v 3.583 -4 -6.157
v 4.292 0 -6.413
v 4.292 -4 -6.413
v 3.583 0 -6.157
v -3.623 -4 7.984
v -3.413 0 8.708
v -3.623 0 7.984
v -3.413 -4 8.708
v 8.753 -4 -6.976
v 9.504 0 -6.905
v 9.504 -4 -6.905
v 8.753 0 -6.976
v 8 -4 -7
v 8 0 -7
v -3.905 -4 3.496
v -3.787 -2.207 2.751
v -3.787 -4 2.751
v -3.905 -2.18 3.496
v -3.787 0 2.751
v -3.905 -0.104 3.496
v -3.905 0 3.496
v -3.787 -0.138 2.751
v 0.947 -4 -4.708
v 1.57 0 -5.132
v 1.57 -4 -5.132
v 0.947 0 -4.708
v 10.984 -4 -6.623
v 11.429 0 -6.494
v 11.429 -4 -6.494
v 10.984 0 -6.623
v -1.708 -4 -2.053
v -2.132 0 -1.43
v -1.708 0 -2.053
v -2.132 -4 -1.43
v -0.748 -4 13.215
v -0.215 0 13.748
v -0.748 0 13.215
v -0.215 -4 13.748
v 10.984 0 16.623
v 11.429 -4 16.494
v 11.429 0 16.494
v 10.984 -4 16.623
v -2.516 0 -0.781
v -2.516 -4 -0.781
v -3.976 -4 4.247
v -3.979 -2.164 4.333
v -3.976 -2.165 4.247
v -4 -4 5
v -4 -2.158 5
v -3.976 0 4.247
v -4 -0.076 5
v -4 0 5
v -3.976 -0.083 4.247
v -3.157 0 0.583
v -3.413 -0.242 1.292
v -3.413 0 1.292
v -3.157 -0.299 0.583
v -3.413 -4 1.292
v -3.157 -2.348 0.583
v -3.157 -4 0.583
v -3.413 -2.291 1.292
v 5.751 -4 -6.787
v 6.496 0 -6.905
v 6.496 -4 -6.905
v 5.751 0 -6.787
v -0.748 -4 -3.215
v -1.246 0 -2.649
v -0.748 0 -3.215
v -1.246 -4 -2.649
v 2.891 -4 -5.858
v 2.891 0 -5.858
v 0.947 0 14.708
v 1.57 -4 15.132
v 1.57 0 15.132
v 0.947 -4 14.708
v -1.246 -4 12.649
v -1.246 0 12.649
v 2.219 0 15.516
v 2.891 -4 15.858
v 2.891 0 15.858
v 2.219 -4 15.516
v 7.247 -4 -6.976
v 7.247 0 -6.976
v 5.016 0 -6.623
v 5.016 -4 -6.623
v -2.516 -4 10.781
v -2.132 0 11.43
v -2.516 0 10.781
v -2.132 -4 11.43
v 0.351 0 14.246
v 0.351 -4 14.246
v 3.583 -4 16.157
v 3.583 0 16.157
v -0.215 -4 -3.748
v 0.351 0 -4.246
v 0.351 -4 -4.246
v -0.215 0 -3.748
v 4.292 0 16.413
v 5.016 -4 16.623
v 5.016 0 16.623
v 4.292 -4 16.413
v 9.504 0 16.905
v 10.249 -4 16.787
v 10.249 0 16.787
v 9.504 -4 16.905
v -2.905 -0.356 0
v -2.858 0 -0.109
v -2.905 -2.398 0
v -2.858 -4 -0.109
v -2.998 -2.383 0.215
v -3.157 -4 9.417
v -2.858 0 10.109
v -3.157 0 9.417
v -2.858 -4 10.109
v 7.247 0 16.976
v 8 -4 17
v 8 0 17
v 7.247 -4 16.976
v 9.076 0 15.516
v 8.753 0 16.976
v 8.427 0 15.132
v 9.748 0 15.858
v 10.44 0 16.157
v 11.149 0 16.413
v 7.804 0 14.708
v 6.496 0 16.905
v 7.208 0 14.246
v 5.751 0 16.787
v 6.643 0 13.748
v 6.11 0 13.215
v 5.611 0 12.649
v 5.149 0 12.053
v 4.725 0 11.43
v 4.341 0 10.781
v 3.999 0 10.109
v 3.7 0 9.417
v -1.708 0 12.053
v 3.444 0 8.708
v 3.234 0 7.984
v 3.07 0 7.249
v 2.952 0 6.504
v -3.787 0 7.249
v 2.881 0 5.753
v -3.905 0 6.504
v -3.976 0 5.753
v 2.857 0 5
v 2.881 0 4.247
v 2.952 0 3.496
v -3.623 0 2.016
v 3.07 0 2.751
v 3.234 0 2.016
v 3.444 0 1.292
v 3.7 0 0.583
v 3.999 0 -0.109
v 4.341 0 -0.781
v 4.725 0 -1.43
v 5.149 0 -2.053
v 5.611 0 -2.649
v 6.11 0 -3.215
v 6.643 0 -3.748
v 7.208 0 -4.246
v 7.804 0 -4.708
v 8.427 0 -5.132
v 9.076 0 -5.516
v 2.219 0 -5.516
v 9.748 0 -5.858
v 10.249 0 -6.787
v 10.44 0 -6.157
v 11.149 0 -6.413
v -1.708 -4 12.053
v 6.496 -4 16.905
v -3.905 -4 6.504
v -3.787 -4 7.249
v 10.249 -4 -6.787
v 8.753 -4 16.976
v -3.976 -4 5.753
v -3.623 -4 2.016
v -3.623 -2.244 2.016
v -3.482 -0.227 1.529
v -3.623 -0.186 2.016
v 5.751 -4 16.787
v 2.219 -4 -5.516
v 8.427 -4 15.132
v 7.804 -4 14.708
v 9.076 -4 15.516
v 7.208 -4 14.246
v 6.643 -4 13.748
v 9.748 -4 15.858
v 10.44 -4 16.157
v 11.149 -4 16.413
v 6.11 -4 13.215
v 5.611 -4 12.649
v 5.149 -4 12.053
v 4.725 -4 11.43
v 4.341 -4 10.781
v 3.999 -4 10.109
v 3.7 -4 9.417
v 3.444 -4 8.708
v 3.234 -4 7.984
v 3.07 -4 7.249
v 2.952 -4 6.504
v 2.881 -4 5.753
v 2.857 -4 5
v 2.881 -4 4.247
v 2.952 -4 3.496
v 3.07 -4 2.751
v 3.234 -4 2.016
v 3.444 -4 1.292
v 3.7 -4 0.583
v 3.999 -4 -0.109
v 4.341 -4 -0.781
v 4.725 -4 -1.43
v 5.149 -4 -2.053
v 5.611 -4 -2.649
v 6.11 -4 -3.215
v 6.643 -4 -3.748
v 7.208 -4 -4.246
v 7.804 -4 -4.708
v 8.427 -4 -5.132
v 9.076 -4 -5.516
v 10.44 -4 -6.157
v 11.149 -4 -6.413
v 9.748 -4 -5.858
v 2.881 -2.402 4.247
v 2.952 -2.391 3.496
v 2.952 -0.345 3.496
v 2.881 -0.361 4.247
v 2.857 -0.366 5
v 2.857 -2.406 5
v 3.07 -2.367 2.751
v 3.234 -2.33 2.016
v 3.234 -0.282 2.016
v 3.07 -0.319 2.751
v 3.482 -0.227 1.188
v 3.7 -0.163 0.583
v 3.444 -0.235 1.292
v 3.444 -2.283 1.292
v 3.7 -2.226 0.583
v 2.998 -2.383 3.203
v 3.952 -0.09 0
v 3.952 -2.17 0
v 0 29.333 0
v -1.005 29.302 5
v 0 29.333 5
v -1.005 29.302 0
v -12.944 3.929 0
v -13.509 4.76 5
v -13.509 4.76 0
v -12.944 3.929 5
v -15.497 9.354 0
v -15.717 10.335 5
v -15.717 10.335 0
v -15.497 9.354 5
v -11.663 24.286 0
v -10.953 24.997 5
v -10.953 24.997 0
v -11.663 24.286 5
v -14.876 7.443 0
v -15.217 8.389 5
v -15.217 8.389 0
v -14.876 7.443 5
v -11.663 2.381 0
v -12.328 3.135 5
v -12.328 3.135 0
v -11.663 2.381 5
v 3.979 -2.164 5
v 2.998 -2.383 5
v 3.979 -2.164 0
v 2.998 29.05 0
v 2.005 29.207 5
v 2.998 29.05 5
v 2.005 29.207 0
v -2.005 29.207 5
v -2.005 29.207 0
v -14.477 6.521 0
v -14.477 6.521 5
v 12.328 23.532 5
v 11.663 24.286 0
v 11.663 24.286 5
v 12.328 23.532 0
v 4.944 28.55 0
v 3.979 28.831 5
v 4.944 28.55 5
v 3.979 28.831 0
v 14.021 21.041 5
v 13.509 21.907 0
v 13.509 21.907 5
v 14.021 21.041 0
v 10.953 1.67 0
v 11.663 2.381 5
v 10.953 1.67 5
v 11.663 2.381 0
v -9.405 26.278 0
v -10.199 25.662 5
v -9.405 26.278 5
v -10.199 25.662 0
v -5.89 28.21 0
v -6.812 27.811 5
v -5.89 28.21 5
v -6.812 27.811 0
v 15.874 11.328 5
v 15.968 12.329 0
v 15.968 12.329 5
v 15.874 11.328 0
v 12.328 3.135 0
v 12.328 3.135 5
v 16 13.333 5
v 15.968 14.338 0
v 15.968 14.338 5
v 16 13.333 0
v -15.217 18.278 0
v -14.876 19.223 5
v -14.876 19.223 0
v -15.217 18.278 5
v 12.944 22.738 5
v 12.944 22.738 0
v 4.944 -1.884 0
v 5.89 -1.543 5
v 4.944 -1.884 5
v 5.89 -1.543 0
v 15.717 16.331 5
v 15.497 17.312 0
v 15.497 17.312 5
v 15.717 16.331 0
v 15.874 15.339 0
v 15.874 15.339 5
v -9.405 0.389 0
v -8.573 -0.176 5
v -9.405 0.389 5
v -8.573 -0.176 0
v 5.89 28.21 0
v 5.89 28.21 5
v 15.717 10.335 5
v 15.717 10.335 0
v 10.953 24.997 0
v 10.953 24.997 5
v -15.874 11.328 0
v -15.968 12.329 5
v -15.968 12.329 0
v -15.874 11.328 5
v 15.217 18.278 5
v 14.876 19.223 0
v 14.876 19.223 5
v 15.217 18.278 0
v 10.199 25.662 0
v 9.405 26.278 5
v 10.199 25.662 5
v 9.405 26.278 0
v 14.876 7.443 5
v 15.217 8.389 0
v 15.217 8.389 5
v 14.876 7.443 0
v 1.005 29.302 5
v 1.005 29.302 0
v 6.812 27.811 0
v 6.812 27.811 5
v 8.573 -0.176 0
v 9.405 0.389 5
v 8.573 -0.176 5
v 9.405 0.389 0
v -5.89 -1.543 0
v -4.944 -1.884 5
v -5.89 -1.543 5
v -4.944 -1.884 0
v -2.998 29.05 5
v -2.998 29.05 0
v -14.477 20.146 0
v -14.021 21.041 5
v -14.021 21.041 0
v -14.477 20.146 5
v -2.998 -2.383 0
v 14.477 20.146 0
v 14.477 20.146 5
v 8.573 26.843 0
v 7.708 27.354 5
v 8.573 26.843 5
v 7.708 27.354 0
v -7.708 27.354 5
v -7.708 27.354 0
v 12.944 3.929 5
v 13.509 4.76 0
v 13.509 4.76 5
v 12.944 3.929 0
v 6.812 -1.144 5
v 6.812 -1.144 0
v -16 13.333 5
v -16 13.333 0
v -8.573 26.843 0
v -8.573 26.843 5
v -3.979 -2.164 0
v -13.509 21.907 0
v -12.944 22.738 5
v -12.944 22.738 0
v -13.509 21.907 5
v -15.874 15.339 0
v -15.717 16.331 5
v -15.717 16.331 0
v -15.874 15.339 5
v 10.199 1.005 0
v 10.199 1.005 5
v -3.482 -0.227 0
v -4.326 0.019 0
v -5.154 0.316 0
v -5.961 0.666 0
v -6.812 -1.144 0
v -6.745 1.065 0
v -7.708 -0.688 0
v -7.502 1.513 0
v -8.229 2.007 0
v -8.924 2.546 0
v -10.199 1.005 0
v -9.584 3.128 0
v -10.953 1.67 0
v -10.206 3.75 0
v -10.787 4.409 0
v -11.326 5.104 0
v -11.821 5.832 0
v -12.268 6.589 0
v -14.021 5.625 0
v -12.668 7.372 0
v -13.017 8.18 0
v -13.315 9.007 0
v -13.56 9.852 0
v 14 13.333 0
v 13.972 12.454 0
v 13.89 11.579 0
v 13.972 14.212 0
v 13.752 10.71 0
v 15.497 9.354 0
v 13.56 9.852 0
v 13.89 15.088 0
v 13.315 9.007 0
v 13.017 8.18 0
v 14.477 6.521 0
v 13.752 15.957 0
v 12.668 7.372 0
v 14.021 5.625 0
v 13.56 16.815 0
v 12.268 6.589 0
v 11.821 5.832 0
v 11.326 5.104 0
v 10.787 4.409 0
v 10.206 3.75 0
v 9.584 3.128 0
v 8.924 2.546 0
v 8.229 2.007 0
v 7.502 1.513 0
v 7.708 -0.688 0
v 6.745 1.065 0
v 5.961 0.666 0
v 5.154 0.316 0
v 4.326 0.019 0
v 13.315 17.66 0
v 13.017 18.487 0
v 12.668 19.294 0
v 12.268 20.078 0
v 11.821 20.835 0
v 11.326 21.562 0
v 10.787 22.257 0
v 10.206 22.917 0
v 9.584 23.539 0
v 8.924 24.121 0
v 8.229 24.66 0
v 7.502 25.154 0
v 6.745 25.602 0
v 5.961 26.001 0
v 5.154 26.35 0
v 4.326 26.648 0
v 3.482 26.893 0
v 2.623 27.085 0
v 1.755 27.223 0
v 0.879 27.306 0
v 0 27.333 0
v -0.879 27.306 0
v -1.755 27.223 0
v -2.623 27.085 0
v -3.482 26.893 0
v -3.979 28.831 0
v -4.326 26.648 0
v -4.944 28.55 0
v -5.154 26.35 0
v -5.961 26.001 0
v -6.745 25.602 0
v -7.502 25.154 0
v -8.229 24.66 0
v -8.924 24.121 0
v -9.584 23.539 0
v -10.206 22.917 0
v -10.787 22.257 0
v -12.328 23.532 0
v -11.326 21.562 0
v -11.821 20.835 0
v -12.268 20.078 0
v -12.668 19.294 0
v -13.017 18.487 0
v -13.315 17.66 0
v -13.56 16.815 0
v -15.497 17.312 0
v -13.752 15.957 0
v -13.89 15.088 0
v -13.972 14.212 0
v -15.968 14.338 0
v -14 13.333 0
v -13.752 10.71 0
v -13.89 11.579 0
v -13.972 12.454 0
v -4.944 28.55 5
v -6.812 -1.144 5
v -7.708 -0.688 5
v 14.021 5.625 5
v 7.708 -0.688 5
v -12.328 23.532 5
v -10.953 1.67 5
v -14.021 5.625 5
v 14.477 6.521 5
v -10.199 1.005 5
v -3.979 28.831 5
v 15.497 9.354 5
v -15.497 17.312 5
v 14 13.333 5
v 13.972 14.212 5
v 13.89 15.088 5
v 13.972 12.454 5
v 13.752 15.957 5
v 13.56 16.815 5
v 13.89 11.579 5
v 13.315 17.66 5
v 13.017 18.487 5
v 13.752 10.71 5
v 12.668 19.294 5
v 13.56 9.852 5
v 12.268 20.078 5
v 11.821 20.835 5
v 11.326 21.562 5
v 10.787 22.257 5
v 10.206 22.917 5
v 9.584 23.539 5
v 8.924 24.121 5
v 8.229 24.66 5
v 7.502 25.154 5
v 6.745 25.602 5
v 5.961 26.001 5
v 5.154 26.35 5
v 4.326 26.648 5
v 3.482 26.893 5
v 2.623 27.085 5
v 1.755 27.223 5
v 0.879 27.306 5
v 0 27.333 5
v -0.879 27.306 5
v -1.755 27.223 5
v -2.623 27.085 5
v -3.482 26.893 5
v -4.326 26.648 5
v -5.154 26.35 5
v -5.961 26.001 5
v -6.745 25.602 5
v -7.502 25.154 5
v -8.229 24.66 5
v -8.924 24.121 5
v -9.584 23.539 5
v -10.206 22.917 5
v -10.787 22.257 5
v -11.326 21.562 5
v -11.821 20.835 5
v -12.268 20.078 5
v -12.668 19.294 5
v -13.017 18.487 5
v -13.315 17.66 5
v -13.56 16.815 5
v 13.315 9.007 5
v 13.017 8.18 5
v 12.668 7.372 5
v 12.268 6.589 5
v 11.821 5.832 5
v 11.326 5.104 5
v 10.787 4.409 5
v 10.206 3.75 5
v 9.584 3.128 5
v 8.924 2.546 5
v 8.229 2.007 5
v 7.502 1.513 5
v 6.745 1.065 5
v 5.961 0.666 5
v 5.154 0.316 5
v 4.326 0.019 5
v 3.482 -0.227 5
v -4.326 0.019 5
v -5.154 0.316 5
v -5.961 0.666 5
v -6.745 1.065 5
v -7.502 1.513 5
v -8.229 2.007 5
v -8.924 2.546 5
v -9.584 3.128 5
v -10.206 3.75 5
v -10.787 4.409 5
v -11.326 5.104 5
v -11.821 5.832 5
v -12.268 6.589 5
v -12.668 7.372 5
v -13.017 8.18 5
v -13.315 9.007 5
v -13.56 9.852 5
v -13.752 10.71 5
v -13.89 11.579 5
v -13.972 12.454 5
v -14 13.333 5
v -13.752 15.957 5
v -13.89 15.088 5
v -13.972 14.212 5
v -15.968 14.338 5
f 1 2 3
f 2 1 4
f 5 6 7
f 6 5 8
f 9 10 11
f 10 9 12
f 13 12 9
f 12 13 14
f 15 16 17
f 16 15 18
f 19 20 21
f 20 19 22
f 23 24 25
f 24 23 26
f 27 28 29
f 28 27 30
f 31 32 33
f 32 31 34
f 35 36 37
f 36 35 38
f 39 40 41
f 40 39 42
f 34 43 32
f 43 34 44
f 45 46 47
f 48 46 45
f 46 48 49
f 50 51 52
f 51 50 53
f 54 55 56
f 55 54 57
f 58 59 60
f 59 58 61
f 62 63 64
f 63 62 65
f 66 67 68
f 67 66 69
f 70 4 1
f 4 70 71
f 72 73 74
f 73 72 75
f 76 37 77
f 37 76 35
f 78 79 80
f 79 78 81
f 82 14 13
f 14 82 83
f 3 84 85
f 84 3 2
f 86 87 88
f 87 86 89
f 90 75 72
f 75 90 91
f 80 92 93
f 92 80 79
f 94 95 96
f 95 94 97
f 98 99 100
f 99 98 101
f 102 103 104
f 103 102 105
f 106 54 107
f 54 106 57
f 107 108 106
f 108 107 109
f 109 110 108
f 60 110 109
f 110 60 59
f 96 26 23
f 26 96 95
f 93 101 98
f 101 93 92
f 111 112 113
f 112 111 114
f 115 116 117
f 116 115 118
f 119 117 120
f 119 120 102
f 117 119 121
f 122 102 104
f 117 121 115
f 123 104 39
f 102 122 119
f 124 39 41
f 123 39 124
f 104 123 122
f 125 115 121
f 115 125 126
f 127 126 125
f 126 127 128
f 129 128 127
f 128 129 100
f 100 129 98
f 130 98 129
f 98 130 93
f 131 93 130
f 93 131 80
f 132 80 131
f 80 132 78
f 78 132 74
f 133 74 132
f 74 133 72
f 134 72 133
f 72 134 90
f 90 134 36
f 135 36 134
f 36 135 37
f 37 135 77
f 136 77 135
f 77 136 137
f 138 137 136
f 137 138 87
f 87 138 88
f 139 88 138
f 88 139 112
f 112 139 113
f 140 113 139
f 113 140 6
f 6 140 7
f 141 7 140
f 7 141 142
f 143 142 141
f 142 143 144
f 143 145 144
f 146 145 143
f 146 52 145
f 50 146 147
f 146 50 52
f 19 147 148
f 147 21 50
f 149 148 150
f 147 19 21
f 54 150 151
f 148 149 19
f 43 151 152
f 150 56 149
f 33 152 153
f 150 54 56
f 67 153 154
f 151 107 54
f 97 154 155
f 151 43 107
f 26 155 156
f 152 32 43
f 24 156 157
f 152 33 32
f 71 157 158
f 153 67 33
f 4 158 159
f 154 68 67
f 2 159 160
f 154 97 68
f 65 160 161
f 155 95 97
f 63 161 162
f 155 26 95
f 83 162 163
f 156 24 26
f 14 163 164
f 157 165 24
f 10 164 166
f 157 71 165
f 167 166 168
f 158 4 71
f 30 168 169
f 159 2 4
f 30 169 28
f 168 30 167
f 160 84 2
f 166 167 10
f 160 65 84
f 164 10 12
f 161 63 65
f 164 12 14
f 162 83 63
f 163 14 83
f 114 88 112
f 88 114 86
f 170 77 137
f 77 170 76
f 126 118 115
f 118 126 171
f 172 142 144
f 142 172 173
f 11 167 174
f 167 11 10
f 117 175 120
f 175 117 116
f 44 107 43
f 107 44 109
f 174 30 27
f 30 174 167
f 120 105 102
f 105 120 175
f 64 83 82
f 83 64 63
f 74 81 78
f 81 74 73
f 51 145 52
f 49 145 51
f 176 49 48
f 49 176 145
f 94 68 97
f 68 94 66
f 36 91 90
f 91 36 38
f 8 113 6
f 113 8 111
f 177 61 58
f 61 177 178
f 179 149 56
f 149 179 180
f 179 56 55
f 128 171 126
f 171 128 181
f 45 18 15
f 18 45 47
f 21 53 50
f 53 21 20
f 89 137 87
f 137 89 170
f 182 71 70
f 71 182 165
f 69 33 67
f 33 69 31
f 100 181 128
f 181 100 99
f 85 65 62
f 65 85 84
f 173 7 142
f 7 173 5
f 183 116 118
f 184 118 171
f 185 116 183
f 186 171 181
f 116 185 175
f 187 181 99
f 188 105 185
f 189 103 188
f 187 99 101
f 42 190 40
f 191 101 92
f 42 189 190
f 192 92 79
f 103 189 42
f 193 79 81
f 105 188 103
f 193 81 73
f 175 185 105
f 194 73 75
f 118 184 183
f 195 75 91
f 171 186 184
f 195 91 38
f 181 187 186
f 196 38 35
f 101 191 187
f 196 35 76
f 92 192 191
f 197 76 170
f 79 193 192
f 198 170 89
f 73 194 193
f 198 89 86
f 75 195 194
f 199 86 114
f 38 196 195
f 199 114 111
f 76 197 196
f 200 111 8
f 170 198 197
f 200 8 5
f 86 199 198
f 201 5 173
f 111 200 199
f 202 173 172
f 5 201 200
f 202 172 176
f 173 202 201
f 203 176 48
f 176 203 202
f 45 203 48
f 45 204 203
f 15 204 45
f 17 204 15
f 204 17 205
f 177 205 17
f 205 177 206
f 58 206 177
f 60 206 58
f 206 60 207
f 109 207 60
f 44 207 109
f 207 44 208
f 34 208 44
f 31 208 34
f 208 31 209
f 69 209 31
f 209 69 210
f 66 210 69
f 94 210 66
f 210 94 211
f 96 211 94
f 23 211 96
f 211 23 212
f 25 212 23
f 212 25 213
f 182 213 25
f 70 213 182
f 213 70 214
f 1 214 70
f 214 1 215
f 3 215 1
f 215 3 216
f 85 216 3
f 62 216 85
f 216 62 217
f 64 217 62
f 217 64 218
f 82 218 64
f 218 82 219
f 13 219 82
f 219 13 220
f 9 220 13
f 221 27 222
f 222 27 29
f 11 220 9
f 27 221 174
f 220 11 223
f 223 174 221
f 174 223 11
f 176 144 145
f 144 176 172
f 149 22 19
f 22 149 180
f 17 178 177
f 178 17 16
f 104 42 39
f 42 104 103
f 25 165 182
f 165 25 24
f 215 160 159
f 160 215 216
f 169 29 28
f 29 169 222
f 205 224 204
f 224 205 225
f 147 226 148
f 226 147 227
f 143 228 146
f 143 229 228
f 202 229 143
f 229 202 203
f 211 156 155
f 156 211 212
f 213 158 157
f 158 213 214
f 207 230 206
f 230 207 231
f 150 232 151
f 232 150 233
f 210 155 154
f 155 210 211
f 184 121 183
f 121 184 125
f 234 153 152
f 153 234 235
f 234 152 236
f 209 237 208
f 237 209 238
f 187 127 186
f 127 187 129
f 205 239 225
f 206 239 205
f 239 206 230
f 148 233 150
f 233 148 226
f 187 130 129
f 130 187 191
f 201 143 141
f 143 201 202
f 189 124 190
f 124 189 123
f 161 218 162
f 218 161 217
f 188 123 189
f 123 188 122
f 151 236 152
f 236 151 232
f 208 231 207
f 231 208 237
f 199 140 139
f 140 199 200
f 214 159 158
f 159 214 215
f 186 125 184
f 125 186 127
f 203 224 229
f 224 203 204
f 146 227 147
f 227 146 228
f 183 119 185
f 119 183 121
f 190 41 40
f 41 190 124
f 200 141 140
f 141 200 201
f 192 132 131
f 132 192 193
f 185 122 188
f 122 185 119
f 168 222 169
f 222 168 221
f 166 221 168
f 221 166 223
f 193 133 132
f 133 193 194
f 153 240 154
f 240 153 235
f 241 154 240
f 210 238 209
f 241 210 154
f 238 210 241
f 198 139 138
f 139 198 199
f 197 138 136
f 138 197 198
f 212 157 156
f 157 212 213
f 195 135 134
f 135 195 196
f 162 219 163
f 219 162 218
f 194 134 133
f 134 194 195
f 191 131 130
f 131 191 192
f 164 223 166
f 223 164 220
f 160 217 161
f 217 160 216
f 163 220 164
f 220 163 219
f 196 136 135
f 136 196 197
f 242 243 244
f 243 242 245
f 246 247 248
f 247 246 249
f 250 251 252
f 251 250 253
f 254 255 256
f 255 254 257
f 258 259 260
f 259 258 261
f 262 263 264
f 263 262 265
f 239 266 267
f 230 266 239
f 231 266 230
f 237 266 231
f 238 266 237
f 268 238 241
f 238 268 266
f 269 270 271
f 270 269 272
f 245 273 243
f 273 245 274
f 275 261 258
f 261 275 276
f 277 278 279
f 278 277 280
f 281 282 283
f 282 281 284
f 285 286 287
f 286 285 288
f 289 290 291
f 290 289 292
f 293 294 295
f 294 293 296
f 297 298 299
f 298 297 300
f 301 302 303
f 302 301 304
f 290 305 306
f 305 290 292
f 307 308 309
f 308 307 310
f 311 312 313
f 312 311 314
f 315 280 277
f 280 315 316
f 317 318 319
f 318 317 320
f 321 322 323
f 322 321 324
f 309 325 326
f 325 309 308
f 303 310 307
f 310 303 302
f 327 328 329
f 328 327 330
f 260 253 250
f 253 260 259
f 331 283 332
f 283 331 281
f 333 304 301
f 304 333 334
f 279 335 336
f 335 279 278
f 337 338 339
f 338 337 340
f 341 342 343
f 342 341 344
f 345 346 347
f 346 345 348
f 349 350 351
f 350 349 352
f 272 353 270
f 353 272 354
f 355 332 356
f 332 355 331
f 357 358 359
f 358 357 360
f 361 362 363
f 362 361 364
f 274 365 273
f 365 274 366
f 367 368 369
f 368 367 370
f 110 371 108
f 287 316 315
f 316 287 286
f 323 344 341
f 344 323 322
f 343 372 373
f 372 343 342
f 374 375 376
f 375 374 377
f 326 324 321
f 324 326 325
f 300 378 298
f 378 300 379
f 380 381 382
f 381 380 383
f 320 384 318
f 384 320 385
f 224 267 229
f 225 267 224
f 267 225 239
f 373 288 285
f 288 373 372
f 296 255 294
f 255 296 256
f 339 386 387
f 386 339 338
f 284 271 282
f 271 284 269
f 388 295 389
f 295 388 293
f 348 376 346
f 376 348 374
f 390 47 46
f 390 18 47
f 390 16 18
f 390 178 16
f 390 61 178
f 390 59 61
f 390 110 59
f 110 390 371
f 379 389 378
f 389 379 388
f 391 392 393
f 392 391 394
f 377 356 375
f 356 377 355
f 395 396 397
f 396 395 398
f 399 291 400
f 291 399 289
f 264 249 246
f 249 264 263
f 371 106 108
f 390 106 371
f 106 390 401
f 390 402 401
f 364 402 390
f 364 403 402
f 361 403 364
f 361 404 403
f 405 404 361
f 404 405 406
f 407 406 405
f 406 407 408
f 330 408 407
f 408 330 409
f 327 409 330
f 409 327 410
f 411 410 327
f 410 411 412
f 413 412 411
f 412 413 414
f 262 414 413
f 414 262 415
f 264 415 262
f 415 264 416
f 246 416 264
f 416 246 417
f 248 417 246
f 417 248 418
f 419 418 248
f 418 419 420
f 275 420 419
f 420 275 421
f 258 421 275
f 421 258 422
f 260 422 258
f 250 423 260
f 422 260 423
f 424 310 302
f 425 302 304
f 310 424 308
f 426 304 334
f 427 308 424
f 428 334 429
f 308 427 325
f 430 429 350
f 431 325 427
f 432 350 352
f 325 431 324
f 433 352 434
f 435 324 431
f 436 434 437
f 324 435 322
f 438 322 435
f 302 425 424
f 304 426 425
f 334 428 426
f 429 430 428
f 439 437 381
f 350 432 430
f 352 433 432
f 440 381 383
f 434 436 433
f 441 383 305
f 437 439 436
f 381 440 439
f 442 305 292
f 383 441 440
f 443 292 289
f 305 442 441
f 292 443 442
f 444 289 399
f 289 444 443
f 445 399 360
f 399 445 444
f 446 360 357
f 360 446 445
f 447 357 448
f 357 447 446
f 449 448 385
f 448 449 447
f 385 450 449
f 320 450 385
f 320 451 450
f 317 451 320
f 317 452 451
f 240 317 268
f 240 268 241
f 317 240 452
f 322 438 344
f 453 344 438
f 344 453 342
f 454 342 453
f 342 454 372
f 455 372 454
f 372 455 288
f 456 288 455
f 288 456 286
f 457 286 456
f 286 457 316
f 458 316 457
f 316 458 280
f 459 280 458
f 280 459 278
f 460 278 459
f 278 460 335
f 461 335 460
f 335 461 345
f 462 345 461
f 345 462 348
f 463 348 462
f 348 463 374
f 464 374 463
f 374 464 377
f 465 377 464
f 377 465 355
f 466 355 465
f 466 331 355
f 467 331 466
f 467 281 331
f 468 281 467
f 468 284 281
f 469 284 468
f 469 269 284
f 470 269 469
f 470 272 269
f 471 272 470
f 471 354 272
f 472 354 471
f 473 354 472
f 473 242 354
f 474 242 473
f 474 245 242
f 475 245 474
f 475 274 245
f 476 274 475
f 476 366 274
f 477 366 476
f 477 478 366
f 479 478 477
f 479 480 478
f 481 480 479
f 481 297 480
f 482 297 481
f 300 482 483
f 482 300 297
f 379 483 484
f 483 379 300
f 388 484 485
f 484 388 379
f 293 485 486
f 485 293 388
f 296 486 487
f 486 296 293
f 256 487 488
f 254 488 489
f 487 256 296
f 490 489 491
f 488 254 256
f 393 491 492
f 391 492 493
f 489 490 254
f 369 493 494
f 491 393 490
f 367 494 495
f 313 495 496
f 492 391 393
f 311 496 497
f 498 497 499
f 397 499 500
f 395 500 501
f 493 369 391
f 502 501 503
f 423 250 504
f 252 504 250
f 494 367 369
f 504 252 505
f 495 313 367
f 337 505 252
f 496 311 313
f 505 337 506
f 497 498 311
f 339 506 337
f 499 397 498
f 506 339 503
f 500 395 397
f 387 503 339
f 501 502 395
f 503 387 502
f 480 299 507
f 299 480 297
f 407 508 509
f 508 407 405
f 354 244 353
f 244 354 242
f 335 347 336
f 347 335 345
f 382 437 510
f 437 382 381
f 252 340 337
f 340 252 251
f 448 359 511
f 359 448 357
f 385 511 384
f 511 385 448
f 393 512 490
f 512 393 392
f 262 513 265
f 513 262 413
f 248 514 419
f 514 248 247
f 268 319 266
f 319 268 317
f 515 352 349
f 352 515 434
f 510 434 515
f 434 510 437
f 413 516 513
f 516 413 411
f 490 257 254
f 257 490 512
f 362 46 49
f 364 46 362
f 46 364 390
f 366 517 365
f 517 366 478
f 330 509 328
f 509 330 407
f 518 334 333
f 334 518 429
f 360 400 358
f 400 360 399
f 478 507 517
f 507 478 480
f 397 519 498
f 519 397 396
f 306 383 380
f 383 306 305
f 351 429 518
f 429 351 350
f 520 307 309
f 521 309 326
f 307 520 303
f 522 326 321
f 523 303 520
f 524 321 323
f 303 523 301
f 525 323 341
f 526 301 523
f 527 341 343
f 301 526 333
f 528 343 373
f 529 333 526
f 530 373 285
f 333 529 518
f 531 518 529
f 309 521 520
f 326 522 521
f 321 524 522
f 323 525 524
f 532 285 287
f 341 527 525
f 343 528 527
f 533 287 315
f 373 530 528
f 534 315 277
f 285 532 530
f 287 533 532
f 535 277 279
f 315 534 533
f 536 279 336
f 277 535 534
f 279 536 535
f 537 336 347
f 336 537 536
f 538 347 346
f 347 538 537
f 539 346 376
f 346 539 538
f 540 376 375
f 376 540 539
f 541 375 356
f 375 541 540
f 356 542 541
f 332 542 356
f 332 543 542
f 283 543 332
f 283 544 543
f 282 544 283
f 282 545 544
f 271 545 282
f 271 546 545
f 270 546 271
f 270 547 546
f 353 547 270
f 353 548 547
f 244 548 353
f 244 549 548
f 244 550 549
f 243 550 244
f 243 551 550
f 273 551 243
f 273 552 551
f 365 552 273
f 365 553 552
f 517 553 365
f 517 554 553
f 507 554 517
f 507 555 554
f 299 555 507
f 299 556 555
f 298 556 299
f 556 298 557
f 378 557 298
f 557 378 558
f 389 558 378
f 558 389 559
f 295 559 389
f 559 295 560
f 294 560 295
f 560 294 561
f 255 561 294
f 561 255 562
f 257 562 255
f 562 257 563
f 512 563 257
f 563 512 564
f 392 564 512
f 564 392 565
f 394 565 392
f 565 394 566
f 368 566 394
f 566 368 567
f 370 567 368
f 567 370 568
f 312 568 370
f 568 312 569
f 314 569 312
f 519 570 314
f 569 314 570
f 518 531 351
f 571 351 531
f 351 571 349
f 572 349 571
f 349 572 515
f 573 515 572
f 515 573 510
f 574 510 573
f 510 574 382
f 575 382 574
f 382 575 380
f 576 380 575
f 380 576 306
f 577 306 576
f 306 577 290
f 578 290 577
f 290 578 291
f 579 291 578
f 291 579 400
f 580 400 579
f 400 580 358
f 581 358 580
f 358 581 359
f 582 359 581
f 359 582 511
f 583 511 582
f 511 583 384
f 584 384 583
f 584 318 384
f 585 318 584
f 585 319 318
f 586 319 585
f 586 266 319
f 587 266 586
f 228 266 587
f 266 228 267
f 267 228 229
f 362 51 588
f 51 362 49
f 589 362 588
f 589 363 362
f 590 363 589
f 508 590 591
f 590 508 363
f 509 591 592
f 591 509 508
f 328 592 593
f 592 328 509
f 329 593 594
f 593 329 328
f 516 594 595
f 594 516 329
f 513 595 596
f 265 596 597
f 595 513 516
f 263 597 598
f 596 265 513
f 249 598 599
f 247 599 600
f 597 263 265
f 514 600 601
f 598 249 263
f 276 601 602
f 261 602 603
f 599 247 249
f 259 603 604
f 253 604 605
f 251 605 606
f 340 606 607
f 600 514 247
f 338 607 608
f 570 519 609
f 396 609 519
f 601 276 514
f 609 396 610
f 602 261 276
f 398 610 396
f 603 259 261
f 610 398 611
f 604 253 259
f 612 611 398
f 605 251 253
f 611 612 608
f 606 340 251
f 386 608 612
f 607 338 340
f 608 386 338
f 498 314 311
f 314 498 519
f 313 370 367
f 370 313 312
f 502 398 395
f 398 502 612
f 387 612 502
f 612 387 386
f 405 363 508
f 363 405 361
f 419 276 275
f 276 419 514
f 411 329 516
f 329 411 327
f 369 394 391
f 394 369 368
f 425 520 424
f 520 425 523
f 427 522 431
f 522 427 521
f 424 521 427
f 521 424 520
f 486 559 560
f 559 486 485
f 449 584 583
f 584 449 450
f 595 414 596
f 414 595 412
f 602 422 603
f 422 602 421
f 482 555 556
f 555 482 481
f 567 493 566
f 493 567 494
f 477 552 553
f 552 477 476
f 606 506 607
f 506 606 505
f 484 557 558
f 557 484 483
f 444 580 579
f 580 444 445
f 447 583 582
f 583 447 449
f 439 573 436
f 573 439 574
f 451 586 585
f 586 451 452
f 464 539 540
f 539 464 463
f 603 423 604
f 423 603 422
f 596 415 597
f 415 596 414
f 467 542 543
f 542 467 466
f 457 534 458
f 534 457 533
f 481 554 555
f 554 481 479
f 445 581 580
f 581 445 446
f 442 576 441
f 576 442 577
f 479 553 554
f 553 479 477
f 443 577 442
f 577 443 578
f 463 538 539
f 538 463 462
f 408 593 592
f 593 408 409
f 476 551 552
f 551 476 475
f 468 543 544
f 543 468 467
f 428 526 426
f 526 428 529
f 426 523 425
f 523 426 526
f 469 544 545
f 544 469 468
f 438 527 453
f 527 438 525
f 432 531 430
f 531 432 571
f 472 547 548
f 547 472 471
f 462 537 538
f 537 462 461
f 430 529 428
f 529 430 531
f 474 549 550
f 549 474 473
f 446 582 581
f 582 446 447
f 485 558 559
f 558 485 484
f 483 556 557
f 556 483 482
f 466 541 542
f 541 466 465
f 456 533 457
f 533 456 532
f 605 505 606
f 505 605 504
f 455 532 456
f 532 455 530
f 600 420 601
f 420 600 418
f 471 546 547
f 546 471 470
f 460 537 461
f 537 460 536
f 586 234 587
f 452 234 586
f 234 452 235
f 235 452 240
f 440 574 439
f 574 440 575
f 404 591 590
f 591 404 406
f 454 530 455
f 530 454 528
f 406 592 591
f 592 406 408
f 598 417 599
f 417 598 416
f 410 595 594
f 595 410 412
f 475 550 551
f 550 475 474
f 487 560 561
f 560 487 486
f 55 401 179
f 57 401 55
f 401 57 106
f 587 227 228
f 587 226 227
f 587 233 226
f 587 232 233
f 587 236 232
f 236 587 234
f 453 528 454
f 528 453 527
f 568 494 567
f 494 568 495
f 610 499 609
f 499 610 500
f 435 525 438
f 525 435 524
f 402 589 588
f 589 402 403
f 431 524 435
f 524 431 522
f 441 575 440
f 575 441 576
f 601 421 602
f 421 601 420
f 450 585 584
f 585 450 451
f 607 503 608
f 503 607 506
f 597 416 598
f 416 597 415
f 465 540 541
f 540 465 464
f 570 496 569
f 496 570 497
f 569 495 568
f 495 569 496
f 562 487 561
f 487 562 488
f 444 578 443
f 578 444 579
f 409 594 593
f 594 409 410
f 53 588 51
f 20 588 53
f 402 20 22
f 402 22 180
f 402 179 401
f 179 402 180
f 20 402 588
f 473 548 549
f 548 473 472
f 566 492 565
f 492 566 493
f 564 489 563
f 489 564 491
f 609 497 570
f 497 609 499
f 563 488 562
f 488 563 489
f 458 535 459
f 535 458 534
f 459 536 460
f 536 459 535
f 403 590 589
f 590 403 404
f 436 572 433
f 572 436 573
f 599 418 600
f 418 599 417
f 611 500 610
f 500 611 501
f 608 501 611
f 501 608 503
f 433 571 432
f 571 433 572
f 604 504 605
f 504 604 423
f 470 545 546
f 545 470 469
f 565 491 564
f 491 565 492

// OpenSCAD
hRadius = 10;
hHeight = 4;
mRadius = 12;
mHeight = 4; 
cRadius = 16;
cHeight = 5;
cThicc = 2;

$fn = 100;

// heart modified from openhome.cc :
module heart_sub_component(radius, height) {
    rotated_angle = 45;
    diameter = radius * 2;

    translate([-radius * cos(rotated_angle), 0, 0]) 
        rotate(-rotated_angle) union() {
            cylinder(r=radius, h=height);
            translate([0, -radius, 0]) 
                cube([diameter, diameter, height]);
        }
}

module heart(radius, height) {
    heart_sub_component(radius, height);
    mirror([1, 0, 0]) heart_sub_component(radius, height);
}

module moon(radius, thicc){
    difference() {
        cylinder(r=radius, h=thicc);
        translate([radius/1.75, 0, 0]) cylinder(r=radius, h=thicc);
    }
}

module ring(radius, height, thicc) {
    difference() {
    cylinder(r=radius, h=cHeight);
    cylinder(r=radius-thicc, h=height);
    }
}

union() {
//rotate([90, 0, 0]) translate([0, 10, 0]) heart(hRadius, hHeight);
rotate([90, 0, 0]) translate([8, 5, 0]) moon(mRadius, mHeight);
translate([0, cRadius/1.2, 0]) ring(cRadius, cHeight, cThicc);
}
